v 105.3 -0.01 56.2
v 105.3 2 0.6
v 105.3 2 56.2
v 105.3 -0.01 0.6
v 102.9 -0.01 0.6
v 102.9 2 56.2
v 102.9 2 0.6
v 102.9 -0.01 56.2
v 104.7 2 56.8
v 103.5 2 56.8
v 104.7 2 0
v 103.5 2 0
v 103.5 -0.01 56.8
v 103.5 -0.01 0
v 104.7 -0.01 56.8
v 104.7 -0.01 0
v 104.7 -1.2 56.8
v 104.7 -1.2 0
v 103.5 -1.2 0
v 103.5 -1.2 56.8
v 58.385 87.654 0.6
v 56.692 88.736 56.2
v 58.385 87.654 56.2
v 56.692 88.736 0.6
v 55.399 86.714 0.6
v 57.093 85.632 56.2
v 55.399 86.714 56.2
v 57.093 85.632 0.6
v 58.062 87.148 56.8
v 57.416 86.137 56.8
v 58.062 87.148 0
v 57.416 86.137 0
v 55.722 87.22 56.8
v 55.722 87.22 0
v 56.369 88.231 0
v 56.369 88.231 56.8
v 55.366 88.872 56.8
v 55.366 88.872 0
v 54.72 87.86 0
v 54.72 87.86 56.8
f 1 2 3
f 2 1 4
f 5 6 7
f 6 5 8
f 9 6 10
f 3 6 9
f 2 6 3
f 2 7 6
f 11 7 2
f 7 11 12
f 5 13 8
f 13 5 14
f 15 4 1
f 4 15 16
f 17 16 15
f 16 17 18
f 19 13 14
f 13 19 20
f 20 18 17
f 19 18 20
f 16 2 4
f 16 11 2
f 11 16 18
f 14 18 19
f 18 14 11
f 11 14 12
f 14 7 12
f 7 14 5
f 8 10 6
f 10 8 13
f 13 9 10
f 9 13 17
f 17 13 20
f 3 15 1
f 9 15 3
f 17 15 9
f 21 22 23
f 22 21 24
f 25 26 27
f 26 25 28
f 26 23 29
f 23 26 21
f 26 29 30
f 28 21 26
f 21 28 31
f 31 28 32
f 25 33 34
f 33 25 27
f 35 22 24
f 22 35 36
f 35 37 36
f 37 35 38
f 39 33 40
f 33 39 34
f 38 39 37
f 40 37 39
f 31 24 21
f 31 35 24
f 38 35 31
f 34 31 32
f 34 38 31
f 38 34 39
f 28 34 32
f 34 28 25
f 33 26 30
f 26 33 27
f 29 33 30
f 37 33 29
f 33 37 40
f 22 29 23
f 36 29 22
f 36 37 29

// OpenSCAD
include <../lib/spool-drybox-lib.scad>;
$fn = 40;
panel_gasket("under");
